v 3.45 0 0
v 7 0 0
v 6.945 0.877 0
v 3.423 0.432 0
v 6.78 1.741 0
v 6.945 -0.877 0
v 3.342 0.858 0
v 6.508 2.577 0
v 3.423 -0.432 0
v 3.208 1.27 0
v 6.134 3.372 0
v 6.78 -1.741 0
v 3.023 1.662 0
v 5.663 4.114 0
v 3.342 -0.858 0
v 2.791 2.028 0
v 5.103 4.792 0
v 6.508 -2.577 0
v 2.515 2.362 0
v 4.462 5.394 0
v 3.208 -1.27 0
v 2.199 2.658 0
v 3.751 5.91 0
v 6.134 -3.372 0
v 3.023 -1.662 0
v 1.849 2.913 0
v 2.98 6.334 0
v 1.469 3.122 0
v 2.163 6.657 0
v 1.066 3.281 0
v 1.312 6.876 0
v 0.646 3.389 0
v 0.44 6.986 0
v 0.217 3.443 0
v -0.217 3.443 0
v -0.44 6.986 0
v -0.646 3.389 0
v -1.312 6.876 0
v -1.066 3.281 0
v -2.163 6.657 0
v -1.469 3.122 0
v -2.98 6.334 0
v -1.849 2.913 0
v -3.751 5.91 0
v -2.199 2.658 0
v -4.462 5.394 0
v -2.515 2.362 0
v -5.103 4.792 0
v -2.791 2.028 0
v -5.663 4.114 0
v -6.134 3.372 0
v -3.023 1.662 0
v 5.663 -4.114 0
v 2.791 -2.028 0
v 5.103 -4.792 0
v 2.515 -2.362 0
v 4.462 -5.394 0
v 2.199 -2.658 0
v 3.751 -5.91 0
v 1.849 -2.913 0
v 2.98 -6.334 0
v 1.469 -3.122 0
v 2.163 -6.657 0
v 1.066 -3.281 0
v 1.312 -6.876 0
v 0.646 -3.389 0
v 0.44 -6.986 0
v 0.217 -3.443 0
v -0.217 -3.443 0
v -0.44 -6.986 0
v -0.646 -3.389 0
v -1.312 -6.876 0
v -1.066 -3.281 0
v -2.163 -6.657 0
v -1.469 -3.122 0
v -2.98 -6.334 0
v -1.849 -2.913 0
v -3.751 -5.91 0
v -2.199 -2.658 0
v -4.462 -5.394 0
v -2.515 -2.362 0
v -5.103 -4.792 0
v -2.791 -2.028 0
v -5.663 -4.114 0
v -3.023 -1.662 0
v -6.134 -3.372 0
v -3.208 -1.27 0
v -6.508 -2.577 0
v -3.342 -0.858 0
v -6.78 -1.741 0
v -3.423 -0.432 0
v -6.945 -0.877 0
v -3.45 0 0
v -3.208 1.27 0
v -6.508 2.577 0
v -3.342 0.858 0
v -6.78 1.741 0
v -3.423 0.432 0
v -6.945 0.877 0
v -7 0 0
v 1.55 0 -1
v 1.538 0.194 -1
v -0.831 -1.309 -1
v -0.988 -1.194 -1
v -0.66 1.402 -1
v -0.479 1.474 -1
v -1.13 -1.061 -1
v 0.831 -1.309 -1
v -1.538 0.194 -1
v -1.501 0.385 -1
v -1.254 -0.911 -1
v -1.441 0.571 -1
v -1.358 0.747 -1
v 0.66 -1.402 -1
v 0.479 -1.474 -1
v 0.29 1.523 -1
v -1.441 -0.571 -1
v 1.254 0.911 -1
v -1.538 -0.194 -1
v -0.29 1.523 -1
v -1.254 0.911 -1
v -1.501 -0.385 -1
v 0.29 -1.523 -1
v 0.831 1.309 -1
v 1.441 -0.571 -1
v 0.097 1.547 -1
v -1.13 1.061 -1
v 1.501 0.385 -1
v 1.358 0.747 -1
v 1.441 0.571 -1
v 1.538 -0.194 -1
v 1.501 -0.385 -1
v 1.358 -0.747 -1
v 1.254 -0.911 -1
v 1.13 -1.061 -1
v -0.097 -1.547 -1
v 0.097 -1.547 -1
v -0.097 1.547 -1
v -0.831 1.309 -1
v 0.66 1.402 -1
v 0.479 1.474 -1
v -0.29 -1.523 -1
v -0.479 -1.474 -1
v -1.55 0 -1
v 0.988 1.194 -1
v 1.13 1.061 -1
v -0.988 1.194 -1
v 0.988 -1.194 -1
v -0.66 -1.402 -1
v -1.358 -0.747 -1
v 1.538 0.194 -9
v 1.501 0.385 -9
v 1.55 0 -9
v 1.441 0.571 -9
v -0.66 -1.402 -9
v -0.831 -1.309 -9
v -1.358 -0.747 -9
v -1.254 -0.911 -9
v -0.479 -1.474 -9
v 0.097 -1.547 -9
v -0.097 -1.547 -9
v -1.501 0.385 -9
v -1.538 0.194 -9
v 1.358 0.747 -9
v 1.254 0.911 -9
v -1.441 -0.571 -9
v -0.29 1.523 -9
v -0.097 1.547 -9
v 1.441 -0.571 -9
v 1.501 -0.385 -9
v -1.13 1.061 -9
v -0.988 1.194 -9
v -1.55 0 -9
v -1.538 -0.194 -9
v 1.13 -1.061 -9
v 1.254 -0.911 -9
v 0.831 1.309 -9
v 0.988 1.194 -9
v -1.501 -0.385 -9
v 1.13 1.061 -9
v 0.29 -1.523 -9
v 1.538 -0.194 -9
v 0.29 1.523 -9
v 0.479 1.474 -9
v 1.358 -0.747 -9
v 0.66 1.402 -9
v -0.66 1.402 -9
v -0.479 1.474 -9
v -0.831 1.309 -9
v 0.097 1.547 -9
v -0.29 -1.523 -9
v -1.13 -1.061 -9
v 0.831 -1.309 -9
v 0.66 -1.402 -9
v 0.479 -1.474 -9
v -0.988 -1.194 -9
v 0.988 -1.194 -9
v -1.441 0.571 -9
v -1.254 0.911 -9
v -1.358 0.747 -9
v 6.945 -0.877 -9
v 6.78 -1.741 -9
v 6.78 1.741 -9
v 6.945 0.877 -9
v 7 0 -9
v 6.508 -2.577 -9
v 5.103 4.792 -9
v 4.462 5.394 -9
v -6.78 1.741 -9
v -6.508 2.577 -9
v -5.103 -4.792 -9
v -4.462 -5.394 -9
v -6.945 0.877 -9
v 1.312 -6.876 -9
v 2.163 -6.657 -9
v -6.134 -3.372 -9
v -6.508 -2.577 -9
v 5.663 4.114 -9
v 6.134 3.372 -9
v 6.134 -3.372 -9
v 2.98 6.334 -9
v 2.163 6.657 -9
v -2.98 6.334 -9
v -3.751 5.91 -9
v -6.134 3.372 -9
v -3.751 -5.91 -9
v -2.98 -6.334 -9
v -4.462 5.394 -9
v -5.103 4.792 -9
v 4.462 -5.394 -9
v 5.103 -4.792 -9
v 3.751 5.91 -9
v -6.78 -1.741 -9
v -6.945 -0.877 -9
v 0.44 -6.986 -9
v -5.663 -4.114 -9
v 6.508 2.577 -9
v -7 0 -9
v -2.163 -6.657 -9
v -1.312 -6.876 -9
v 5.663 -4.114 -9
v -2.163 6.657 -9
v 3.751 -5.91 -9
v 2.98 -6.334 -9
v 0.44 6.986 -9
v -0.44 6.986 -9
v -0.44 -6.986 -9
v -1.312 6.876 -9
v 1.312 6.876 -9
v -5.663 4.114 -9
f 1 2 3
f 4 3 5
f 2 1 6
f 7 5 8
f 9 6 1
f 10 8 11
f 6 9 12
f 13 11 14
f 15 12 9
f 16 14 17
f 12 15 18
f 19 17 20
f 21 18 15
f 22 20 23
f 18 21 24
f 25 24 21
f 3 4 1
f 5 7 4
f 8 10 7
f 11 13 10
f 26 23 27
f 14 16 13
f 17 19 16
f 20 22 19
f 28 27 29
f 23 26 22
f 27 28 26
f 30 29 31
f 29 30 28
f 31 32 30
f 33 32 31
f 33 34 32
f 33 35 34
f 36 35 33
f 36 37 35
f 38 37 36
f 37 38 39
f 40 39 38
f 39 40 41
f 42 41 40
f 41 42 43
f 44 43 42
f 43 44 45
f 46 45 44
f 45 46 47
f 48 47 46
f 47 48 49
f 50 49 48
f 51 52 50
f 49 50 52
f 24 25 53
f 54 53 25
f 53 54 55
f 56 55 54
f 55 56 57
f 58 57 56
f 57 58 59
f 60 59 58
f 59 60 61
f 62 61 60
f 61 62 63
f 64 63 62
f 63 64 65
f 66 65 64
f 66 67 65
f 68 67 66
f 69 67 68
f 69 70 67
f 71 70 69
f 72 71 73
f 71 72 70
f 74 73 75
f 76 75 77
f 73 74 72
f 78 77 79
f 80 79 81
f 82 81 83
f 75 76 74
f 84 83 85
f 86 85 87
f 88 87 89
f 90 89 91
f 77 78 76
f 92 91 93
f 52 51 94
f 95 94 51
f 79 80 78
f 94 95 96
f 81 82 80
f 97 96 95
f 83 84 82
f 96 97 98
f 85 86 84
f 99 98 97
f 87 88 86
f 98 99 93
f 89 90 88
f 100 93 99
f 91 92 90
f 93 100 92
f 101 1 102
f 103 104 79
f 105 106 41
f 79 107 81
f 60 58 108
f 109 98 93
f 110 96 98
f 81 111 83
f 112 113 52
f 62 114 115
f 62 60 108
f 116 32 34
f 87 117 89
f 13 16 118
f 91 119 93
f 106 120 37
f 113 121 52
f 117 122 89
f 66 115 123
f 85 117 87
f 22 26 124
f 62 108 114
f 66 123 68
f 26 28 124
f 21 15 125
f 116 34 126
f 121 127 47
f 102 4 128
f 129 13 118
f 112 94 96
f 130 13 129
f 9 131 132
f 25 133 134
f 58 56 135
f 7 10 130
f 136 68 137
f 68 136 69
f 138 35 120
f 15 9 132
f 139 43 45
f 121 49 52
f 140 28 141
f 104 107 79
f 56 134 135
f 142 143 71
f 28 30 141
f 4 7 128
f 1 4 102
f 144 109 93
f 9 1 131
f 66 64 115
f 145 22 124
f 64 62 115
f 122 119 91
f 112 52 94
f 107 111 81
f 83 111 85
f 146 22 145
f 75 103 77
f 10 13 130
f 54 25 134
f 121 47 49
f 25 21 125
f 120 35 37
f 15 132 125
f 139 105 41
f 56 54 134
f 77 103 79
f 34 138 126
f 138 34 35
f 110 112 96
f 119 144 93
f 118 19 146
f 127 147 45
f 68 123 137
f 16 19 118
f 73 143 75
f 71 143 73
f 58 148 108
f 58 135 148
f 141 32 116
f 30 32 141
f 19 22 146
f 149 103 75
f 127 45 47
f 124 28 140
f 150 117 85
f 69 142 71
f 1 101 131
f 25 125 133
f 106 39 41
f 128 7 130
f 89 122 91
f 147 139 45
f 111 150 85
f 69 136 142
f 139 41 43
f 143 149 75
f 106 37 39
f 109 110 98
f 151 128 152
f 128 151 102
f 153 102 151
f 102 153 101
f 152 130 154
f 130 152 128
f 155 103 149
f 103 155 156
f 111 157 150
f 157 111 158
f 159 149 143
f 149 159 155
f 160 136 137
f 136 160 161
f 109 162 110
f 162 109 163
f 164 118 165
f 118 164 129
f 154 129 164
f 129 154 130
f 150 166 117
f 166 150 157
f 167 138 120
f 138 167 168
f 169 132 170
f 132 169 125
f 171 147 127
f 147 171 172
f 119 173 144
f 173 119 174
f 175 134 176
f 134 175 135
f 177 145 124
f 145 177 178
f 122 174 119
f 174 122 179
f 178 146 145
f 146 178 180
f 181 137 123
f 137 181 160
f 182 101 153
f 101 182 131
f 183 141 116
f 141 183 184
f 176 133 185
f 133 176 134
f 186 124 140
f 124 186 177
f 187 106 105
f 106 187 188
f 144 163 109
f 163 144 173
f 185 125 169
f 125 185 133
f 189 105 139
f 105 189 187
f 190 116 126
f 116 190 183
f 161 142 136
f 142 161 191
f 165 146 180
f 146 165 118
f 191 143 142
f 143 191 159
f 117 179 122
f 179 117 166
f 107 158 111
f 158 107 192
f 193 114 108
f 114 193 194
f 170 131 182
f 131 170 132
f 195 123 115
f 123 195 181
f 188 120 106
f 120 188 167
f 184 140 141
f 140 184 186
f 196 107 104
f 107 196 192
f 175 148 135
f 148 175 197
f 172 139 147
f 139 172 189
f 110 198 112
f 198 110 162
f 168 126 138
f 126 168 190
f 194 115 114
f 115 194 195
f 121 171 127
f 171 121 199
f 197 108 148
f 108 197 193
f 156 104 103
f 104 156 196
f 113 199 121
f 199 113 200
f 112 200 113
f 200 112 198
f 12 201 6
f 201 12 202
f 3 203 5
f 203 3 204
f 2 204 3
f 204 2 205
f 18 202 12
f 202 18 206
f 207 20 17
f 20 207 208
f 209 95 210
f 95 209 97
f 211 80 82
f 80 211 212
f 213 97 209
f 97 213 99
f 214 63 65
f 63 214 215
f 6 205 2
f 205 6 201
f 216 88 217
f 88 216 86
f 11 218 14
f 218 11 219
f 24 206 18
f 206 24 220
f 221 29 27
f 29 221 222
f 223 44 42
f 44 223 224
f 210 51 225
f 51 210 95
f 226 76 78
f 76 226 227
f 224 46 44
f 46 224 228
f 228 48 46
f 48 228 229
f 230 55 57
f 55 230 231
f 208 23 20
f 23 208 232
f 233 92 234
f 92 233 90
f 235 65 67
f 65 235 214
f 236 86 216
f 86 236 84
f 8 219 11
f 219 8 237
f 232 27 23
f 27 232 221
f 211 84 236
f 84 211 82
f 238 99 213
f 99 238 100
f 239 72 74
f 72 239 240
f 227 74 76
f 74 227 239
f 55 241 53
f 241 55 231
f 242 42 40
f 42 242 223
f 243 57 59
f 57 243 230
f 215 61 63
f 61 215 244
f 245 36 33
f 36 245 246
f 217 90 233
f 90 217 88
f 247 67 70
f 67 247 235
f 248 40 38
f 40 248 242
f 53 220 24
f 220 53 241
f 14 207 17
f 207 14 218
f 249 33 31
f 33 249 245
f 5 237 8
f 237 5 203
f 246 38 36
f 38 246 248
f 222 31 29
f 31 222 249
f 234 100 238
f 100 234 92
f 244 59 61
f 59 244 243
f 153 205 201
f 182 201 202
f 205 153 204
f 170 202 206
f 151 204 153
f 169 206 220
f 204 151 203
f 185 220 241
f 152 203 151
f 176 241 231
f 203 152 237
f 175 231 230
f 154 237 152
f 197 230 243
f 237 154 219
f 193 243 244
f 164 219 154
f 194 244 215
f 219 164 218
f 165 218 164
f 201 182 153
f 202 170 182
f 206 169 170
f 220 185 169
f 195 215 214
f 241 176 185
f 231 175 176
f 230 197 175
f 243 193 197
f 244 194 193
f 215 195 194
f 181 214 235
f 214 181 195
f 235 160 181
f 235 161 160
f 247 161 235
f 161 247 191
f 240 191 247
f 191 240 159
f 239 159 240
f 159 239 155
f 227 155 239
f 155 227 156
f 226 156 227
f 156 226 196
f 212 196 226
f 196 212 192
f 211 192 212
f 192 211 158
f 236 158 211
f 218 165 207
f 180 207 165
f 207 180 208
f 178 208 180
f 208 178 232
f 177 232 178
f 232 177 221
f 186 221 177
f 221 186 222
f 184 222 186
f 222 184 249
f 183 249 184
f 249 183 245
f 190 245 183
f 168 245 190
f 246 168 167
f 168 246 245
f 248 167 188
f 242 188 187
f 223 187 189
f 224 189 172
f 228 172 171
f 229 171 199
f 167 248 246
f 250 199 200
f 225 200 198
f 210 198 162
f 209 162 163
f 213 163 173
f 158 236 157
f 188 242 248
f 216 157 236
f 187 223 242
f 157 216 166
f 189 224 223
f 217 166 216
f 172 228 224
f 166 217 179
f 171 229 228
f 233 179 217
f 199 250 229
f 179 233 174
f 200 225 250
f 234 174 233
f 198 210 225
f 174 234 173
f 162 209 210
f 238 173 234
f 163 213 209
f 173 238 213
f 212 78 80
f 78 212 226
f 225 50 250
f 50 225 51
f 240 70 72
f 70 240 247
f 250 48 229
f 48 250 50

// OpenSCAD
$fn = 50;

difference() {
	union() {
		translate(v = [0, 0, -9.0]) {
			cylinder(h = 9, r = 7.0);
		}
	}
	union() {
		translate(v = [0, 0, 0]) {
			rotate(a = [0, 0, 0]) {
				difference() {
					union() {
						translate(v = [0, 0, -12.0]) {
							cylinder(h = 12, r = 1.25);
						}
						translate(v = [0, 0, -1.0]) {
							cylinder(h = 1.0, r1 = 1.55, r2 = 3.45);
						}
						translate(v = [0, 0, -12.0]) {
							cylinder(h = 12, r = 1.55);
						}
						translate(v = [0, 0, -12.0]) {
							cylinder(h = 12, r = 1.25);
						}
					}
					union();
				}
			}
		}
	}
}
